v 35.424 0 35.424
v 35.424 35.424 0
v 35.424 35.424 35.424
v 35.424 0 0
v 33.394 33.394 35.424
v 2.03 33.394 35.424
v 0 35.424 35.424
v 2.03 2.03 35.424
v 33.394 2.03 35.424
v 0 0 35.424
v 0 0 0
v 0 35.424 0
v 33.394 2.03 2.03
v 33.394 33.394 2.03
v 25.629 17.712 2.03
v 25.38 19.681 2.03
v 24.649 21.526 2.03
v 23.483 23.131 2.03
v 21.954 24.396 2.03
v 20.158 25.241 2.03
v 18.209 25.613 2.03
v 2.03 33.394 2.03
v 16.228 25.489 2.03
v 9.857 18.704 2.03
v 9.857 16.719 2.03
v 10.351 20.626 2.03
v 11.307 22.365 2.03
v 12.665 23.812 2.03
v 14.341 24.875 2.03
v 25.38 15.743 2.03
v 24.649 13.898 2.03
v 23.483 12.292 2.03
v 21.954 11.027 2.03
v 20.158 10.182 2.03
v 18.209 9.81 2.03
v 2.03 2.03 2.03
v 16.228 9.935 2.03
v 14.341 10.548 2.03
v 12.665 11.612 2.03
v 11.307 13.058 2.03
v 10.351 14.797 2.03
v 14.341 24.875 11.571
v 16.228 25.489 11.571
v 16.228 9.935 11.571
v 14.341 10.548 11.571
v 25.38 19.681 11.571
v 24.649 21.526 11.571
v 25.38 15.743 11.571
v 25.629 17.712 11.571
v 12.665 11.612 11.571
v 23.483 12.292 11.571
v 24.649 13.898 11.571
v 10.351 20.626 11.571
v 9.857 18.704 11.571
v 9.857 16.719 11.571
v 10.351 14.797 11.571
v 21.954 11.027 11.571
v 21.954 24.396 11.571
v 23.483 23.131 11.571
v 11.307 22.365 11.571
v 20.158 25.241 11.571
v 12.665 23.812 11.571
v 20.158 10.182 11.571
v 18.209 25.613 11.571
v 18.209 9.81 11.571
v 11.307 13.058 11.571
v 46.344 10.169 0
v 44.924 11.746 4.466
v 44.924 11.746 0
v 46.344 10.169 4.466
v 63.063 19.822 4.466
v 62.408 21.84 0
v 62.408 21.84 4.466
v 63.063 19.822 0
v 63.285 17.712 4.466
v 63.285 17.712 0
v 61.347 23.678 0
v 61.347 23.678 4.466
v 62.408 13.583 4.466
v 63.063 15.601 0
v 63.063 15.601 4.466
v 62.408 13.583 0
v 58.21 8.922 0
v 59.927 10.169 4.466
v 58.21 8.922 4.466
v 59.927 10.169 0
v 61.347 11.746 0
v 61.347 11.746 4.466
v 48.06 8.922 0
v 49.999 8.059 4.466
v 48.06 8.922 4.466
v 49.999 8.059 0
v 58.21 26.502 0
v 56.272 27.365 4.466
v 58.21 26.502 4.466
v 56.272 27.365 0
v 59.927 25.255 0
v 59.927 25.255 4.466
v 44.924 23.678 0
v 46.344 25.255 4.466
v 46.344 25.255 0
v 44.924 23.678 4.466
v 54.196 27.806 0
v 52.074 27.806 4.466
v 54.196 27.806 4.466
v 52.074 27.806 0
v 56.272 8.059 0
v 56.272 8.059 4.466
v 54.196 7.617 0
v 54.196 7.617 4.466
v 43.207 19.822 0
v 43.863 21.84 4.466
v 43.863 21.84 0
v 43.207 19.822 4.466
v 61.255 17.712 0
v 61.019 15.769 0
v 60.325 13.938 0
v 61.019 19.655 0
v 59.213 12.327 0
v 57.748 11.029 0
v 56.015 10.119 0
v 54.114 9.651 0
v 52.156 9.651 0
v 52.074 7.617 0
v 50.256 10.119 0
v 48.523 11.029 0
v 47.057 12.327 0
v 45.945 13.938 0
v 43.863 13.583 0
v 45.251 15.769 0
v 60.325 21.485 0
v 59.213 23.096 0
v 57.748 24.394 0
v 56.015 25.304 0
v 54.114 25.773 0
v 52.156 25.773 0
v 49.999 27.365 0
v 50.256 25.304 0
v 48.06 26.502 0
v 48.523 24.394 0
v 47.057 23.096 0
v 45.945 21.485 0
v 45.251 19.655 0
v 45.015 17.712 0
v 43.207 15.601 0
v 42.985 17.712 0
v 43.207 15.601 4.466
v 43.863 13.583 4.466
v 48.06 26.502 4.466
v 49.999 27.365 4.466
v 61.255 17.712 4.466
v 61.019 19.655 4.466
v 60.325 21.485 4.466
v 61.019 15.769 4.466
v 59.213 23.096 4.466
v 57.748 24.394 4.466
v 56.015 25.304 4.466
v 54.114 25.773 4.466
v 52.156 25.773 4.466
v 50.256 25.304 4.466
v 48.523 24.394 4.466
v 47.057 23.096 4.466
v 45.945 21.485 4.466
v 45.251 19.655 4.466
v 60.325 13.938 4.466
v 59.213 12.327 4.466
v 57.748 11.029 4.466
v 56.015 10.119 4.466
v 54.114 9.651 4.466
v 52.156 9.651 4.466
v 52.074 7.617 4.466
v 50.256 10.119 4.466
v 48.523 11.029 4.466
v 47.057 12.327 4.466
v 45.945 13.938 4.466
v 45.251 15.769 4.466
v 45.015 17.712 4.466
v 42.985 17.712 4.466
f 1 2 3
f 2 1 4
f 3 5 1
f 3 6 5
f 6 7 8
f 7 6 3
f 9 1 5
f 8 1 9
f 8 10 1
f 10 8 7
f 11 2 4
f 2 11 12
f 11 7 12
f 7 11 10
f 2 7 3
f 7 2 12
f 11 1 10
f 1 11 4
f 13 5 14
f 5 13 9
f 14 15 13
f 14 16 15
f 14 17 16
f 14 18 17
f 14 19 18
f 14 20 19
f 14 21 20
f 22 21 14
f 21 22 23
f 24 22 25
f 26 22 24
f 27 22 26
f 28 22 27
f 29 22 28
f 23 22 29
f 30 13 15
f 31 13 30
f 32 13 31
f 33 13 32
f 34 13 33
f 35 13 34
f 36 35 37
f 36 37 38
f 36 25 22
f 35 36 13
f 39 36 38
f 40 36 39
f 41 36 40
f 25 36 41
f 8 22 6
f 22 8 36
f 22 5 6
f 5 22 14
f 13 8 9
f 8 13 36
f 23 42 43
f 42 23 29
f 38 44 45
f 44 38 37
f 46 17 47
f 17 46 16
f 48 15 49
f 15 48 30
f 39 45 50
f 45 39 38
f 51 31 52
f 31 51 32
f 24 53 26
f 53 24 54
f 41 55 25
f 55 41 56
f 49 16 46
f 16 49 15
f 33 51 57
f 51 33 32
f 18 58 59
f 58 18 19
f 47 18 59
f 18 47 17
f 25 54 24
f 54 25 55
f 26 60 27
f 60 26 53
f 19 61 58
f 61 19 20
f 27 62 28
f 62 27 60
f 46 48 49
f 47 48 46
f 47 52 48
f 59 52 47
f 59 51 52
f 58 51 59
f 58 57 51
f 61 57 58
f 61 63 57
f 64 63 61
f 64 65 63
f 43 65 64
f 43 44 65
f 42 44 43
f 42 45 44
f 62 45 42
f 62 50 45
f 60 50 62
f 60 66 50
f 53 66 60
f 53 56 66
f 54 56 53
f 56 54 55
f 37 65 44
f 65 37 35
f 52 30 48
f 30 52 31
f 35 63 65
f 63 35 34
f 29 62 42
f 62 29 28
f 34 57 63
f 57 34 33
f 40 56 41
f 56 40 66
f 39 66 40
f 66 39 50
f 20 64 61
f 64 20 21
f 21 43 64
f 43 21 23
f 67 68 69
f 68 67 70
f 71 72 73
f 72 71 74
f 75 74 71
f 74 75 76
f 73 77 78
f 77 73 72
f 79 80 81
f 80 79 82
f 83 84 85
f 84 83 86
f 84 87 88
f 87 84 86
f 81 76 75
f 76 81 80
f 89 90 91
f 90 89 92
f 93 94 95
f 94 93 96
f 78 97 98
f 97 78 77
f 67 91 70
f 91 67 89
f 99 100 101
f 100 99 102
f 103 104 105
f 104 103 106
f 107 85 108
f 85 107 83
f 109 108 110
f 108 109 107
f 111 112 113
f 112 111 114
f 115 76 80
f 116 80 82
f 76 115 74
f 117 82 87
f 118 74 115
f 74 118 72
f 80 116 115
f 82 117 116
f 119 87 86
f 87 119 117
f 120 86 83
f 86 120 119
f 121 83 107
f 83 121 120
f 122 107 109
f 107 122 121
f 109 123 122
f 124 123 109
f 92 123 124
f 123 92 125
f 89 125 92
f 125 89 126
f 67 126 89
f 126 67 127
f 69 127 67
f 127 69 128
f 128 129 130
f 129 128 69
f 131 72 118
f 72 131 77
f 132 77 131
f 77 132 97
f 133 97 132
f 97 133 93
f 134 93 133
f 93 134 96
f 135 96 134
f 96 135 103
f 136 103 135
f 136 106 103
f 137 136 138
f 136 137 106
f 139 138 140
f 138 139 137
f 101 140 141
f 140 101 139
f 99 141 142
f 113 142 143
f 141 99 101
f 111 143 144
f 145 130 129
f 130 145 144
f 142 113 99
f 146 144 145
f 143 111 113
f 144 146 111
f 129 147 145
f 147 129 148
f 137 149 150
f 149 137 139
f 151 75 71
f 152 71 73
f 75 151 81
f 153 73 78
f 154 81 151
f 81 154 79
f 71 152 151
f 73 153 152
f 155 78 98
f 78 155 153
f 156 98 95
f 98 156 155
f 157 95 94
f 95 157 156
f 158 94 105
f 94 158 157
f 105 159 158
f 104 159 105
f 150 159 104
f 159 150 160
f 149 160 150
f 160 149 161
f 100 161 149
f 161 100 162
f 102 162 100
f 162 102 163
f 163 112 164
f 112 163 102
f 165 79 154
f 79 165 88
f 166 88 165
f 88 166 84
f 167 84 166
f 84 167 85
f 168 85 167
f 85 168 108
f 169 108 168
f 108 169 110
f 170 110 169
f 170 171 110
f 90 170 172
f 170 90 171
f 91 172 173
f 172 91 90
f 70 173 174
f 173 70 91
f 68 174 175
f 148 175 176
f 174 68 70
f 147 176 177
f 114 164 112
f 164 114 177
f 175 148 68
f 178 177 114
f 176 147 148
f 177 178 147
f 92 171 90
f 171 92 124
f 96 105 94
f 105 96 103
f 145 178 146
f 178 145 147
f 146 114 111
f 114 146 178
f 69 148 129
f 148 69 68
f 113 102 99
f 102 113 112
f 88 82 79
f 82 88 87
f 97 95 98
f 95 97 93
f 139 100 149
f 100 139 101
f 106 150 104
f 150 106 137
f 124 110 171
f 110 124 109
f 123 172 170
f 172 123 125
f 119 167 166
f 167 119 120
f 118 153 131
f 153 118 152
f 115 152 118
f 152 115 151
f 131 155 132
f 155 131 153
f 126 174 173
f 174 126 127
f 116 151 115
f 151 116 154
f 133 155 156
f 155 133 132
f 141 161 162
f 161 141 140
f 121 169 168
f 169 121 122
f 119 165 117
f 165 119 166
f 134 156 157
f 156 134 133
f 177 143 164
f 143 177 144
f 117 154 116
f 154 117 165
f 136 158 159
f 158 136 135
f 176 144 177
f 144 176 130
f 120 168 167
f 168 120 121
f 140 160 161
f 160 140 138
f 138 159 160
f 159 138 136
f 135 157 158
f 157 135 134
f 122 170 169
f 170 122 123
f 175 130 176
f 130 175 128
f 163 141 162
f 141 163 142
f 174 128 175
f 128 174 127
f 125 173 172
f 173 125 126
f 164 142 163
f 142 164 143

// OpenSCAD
/*
	kube.scad - OpenSCAD code generating the Fluksokube enclosure

	Copyright (C) 2014 Bart Van Der Meerssche <bart@flukso.net>

	This program is free software: you can redistribute it and/or modify
	it under the terms of the GNU General Public License as published by
	the Free Software Foundation, either version 3 of the License, or
	(at your option) any later version.

	This program is distributed in the hope that it will be useful,
	but WITHOUT ANY WARRANTY; without even the implied warranty of
	MERCHANTABILITY or FITNESS FOR A PARTICULAR PURPOSE. See the
	GNU General Public License for more details.

	You should have received a copy of the GNU General Public License
	along with this program. If not, see <http://www.gnu.org/licenses/>.
*/

/*$fn = 100; /* number of facets per circle */

/*
	_h = height
	_w = width
	_r = radius
	_t = tolerance
	_s = scaling factor (printer specific)
*/

dim_s = 1;
dim_s = 1.015; /* makerbot */
kube_s = [dim_s, dim_s, dim_s];

magnet_h = 5;
magnet_t = 0.2;
magnet_r = 8 - magnet_t; /* inner diameter now! */

flk_h = 23.5;
flk_t = 0.2;
flk_w = 30.5 + 2*flk_t;

wall_w = 2;
outer_w = flk_w + 2*wall_w;

support_h = outer_w - wall_w - flk_h;
support_r = magnet_r;

ring_h = support_h - magnet_h;
ring_t = 0.2;
ring_inner_r = support_r + ring_t;
ring_outer_r = ring_inner_r + 2;

echo("*** kube dimensions ***");
echo("scaling vector", "=", kube_s);
echo("magnet diameter", "=", magnet_r*2);
echo("flk width", "=", flk_w);
echo("kube width", "=", outer_w);
echo("support diameter", "=", support_r*2);
echo("support height", "=", support_h);
echo("ring height", "=", ring_h);
echo("ring inner diameter", "=", ring_inner_r*2);
echo("ring outer diameter", "=", ring_outer_r*2);
echo("***********************");

module kube()
{
	difference() {
		cube(outer_w);
		translate([wall_w, wall_w, wall_w]) {
			cube([flk_w, flk_w, outer_w - wall_w]);
		}
	}

	translate([outer_w/2, outer_w/2, wall_w]) {
		cylinder(r=support_r, h=support_h);
	}
}

module ring()
{
	difference() {
		cylinder(r=ring_outer_r, h=ring_h);
		cylinder(r=ring_inner_r, h=ring_h);
	}
}

scale(kube_s) {
	kube();
	translate([1.5*outer_w, outer_w/2, 0]) ring();
}
